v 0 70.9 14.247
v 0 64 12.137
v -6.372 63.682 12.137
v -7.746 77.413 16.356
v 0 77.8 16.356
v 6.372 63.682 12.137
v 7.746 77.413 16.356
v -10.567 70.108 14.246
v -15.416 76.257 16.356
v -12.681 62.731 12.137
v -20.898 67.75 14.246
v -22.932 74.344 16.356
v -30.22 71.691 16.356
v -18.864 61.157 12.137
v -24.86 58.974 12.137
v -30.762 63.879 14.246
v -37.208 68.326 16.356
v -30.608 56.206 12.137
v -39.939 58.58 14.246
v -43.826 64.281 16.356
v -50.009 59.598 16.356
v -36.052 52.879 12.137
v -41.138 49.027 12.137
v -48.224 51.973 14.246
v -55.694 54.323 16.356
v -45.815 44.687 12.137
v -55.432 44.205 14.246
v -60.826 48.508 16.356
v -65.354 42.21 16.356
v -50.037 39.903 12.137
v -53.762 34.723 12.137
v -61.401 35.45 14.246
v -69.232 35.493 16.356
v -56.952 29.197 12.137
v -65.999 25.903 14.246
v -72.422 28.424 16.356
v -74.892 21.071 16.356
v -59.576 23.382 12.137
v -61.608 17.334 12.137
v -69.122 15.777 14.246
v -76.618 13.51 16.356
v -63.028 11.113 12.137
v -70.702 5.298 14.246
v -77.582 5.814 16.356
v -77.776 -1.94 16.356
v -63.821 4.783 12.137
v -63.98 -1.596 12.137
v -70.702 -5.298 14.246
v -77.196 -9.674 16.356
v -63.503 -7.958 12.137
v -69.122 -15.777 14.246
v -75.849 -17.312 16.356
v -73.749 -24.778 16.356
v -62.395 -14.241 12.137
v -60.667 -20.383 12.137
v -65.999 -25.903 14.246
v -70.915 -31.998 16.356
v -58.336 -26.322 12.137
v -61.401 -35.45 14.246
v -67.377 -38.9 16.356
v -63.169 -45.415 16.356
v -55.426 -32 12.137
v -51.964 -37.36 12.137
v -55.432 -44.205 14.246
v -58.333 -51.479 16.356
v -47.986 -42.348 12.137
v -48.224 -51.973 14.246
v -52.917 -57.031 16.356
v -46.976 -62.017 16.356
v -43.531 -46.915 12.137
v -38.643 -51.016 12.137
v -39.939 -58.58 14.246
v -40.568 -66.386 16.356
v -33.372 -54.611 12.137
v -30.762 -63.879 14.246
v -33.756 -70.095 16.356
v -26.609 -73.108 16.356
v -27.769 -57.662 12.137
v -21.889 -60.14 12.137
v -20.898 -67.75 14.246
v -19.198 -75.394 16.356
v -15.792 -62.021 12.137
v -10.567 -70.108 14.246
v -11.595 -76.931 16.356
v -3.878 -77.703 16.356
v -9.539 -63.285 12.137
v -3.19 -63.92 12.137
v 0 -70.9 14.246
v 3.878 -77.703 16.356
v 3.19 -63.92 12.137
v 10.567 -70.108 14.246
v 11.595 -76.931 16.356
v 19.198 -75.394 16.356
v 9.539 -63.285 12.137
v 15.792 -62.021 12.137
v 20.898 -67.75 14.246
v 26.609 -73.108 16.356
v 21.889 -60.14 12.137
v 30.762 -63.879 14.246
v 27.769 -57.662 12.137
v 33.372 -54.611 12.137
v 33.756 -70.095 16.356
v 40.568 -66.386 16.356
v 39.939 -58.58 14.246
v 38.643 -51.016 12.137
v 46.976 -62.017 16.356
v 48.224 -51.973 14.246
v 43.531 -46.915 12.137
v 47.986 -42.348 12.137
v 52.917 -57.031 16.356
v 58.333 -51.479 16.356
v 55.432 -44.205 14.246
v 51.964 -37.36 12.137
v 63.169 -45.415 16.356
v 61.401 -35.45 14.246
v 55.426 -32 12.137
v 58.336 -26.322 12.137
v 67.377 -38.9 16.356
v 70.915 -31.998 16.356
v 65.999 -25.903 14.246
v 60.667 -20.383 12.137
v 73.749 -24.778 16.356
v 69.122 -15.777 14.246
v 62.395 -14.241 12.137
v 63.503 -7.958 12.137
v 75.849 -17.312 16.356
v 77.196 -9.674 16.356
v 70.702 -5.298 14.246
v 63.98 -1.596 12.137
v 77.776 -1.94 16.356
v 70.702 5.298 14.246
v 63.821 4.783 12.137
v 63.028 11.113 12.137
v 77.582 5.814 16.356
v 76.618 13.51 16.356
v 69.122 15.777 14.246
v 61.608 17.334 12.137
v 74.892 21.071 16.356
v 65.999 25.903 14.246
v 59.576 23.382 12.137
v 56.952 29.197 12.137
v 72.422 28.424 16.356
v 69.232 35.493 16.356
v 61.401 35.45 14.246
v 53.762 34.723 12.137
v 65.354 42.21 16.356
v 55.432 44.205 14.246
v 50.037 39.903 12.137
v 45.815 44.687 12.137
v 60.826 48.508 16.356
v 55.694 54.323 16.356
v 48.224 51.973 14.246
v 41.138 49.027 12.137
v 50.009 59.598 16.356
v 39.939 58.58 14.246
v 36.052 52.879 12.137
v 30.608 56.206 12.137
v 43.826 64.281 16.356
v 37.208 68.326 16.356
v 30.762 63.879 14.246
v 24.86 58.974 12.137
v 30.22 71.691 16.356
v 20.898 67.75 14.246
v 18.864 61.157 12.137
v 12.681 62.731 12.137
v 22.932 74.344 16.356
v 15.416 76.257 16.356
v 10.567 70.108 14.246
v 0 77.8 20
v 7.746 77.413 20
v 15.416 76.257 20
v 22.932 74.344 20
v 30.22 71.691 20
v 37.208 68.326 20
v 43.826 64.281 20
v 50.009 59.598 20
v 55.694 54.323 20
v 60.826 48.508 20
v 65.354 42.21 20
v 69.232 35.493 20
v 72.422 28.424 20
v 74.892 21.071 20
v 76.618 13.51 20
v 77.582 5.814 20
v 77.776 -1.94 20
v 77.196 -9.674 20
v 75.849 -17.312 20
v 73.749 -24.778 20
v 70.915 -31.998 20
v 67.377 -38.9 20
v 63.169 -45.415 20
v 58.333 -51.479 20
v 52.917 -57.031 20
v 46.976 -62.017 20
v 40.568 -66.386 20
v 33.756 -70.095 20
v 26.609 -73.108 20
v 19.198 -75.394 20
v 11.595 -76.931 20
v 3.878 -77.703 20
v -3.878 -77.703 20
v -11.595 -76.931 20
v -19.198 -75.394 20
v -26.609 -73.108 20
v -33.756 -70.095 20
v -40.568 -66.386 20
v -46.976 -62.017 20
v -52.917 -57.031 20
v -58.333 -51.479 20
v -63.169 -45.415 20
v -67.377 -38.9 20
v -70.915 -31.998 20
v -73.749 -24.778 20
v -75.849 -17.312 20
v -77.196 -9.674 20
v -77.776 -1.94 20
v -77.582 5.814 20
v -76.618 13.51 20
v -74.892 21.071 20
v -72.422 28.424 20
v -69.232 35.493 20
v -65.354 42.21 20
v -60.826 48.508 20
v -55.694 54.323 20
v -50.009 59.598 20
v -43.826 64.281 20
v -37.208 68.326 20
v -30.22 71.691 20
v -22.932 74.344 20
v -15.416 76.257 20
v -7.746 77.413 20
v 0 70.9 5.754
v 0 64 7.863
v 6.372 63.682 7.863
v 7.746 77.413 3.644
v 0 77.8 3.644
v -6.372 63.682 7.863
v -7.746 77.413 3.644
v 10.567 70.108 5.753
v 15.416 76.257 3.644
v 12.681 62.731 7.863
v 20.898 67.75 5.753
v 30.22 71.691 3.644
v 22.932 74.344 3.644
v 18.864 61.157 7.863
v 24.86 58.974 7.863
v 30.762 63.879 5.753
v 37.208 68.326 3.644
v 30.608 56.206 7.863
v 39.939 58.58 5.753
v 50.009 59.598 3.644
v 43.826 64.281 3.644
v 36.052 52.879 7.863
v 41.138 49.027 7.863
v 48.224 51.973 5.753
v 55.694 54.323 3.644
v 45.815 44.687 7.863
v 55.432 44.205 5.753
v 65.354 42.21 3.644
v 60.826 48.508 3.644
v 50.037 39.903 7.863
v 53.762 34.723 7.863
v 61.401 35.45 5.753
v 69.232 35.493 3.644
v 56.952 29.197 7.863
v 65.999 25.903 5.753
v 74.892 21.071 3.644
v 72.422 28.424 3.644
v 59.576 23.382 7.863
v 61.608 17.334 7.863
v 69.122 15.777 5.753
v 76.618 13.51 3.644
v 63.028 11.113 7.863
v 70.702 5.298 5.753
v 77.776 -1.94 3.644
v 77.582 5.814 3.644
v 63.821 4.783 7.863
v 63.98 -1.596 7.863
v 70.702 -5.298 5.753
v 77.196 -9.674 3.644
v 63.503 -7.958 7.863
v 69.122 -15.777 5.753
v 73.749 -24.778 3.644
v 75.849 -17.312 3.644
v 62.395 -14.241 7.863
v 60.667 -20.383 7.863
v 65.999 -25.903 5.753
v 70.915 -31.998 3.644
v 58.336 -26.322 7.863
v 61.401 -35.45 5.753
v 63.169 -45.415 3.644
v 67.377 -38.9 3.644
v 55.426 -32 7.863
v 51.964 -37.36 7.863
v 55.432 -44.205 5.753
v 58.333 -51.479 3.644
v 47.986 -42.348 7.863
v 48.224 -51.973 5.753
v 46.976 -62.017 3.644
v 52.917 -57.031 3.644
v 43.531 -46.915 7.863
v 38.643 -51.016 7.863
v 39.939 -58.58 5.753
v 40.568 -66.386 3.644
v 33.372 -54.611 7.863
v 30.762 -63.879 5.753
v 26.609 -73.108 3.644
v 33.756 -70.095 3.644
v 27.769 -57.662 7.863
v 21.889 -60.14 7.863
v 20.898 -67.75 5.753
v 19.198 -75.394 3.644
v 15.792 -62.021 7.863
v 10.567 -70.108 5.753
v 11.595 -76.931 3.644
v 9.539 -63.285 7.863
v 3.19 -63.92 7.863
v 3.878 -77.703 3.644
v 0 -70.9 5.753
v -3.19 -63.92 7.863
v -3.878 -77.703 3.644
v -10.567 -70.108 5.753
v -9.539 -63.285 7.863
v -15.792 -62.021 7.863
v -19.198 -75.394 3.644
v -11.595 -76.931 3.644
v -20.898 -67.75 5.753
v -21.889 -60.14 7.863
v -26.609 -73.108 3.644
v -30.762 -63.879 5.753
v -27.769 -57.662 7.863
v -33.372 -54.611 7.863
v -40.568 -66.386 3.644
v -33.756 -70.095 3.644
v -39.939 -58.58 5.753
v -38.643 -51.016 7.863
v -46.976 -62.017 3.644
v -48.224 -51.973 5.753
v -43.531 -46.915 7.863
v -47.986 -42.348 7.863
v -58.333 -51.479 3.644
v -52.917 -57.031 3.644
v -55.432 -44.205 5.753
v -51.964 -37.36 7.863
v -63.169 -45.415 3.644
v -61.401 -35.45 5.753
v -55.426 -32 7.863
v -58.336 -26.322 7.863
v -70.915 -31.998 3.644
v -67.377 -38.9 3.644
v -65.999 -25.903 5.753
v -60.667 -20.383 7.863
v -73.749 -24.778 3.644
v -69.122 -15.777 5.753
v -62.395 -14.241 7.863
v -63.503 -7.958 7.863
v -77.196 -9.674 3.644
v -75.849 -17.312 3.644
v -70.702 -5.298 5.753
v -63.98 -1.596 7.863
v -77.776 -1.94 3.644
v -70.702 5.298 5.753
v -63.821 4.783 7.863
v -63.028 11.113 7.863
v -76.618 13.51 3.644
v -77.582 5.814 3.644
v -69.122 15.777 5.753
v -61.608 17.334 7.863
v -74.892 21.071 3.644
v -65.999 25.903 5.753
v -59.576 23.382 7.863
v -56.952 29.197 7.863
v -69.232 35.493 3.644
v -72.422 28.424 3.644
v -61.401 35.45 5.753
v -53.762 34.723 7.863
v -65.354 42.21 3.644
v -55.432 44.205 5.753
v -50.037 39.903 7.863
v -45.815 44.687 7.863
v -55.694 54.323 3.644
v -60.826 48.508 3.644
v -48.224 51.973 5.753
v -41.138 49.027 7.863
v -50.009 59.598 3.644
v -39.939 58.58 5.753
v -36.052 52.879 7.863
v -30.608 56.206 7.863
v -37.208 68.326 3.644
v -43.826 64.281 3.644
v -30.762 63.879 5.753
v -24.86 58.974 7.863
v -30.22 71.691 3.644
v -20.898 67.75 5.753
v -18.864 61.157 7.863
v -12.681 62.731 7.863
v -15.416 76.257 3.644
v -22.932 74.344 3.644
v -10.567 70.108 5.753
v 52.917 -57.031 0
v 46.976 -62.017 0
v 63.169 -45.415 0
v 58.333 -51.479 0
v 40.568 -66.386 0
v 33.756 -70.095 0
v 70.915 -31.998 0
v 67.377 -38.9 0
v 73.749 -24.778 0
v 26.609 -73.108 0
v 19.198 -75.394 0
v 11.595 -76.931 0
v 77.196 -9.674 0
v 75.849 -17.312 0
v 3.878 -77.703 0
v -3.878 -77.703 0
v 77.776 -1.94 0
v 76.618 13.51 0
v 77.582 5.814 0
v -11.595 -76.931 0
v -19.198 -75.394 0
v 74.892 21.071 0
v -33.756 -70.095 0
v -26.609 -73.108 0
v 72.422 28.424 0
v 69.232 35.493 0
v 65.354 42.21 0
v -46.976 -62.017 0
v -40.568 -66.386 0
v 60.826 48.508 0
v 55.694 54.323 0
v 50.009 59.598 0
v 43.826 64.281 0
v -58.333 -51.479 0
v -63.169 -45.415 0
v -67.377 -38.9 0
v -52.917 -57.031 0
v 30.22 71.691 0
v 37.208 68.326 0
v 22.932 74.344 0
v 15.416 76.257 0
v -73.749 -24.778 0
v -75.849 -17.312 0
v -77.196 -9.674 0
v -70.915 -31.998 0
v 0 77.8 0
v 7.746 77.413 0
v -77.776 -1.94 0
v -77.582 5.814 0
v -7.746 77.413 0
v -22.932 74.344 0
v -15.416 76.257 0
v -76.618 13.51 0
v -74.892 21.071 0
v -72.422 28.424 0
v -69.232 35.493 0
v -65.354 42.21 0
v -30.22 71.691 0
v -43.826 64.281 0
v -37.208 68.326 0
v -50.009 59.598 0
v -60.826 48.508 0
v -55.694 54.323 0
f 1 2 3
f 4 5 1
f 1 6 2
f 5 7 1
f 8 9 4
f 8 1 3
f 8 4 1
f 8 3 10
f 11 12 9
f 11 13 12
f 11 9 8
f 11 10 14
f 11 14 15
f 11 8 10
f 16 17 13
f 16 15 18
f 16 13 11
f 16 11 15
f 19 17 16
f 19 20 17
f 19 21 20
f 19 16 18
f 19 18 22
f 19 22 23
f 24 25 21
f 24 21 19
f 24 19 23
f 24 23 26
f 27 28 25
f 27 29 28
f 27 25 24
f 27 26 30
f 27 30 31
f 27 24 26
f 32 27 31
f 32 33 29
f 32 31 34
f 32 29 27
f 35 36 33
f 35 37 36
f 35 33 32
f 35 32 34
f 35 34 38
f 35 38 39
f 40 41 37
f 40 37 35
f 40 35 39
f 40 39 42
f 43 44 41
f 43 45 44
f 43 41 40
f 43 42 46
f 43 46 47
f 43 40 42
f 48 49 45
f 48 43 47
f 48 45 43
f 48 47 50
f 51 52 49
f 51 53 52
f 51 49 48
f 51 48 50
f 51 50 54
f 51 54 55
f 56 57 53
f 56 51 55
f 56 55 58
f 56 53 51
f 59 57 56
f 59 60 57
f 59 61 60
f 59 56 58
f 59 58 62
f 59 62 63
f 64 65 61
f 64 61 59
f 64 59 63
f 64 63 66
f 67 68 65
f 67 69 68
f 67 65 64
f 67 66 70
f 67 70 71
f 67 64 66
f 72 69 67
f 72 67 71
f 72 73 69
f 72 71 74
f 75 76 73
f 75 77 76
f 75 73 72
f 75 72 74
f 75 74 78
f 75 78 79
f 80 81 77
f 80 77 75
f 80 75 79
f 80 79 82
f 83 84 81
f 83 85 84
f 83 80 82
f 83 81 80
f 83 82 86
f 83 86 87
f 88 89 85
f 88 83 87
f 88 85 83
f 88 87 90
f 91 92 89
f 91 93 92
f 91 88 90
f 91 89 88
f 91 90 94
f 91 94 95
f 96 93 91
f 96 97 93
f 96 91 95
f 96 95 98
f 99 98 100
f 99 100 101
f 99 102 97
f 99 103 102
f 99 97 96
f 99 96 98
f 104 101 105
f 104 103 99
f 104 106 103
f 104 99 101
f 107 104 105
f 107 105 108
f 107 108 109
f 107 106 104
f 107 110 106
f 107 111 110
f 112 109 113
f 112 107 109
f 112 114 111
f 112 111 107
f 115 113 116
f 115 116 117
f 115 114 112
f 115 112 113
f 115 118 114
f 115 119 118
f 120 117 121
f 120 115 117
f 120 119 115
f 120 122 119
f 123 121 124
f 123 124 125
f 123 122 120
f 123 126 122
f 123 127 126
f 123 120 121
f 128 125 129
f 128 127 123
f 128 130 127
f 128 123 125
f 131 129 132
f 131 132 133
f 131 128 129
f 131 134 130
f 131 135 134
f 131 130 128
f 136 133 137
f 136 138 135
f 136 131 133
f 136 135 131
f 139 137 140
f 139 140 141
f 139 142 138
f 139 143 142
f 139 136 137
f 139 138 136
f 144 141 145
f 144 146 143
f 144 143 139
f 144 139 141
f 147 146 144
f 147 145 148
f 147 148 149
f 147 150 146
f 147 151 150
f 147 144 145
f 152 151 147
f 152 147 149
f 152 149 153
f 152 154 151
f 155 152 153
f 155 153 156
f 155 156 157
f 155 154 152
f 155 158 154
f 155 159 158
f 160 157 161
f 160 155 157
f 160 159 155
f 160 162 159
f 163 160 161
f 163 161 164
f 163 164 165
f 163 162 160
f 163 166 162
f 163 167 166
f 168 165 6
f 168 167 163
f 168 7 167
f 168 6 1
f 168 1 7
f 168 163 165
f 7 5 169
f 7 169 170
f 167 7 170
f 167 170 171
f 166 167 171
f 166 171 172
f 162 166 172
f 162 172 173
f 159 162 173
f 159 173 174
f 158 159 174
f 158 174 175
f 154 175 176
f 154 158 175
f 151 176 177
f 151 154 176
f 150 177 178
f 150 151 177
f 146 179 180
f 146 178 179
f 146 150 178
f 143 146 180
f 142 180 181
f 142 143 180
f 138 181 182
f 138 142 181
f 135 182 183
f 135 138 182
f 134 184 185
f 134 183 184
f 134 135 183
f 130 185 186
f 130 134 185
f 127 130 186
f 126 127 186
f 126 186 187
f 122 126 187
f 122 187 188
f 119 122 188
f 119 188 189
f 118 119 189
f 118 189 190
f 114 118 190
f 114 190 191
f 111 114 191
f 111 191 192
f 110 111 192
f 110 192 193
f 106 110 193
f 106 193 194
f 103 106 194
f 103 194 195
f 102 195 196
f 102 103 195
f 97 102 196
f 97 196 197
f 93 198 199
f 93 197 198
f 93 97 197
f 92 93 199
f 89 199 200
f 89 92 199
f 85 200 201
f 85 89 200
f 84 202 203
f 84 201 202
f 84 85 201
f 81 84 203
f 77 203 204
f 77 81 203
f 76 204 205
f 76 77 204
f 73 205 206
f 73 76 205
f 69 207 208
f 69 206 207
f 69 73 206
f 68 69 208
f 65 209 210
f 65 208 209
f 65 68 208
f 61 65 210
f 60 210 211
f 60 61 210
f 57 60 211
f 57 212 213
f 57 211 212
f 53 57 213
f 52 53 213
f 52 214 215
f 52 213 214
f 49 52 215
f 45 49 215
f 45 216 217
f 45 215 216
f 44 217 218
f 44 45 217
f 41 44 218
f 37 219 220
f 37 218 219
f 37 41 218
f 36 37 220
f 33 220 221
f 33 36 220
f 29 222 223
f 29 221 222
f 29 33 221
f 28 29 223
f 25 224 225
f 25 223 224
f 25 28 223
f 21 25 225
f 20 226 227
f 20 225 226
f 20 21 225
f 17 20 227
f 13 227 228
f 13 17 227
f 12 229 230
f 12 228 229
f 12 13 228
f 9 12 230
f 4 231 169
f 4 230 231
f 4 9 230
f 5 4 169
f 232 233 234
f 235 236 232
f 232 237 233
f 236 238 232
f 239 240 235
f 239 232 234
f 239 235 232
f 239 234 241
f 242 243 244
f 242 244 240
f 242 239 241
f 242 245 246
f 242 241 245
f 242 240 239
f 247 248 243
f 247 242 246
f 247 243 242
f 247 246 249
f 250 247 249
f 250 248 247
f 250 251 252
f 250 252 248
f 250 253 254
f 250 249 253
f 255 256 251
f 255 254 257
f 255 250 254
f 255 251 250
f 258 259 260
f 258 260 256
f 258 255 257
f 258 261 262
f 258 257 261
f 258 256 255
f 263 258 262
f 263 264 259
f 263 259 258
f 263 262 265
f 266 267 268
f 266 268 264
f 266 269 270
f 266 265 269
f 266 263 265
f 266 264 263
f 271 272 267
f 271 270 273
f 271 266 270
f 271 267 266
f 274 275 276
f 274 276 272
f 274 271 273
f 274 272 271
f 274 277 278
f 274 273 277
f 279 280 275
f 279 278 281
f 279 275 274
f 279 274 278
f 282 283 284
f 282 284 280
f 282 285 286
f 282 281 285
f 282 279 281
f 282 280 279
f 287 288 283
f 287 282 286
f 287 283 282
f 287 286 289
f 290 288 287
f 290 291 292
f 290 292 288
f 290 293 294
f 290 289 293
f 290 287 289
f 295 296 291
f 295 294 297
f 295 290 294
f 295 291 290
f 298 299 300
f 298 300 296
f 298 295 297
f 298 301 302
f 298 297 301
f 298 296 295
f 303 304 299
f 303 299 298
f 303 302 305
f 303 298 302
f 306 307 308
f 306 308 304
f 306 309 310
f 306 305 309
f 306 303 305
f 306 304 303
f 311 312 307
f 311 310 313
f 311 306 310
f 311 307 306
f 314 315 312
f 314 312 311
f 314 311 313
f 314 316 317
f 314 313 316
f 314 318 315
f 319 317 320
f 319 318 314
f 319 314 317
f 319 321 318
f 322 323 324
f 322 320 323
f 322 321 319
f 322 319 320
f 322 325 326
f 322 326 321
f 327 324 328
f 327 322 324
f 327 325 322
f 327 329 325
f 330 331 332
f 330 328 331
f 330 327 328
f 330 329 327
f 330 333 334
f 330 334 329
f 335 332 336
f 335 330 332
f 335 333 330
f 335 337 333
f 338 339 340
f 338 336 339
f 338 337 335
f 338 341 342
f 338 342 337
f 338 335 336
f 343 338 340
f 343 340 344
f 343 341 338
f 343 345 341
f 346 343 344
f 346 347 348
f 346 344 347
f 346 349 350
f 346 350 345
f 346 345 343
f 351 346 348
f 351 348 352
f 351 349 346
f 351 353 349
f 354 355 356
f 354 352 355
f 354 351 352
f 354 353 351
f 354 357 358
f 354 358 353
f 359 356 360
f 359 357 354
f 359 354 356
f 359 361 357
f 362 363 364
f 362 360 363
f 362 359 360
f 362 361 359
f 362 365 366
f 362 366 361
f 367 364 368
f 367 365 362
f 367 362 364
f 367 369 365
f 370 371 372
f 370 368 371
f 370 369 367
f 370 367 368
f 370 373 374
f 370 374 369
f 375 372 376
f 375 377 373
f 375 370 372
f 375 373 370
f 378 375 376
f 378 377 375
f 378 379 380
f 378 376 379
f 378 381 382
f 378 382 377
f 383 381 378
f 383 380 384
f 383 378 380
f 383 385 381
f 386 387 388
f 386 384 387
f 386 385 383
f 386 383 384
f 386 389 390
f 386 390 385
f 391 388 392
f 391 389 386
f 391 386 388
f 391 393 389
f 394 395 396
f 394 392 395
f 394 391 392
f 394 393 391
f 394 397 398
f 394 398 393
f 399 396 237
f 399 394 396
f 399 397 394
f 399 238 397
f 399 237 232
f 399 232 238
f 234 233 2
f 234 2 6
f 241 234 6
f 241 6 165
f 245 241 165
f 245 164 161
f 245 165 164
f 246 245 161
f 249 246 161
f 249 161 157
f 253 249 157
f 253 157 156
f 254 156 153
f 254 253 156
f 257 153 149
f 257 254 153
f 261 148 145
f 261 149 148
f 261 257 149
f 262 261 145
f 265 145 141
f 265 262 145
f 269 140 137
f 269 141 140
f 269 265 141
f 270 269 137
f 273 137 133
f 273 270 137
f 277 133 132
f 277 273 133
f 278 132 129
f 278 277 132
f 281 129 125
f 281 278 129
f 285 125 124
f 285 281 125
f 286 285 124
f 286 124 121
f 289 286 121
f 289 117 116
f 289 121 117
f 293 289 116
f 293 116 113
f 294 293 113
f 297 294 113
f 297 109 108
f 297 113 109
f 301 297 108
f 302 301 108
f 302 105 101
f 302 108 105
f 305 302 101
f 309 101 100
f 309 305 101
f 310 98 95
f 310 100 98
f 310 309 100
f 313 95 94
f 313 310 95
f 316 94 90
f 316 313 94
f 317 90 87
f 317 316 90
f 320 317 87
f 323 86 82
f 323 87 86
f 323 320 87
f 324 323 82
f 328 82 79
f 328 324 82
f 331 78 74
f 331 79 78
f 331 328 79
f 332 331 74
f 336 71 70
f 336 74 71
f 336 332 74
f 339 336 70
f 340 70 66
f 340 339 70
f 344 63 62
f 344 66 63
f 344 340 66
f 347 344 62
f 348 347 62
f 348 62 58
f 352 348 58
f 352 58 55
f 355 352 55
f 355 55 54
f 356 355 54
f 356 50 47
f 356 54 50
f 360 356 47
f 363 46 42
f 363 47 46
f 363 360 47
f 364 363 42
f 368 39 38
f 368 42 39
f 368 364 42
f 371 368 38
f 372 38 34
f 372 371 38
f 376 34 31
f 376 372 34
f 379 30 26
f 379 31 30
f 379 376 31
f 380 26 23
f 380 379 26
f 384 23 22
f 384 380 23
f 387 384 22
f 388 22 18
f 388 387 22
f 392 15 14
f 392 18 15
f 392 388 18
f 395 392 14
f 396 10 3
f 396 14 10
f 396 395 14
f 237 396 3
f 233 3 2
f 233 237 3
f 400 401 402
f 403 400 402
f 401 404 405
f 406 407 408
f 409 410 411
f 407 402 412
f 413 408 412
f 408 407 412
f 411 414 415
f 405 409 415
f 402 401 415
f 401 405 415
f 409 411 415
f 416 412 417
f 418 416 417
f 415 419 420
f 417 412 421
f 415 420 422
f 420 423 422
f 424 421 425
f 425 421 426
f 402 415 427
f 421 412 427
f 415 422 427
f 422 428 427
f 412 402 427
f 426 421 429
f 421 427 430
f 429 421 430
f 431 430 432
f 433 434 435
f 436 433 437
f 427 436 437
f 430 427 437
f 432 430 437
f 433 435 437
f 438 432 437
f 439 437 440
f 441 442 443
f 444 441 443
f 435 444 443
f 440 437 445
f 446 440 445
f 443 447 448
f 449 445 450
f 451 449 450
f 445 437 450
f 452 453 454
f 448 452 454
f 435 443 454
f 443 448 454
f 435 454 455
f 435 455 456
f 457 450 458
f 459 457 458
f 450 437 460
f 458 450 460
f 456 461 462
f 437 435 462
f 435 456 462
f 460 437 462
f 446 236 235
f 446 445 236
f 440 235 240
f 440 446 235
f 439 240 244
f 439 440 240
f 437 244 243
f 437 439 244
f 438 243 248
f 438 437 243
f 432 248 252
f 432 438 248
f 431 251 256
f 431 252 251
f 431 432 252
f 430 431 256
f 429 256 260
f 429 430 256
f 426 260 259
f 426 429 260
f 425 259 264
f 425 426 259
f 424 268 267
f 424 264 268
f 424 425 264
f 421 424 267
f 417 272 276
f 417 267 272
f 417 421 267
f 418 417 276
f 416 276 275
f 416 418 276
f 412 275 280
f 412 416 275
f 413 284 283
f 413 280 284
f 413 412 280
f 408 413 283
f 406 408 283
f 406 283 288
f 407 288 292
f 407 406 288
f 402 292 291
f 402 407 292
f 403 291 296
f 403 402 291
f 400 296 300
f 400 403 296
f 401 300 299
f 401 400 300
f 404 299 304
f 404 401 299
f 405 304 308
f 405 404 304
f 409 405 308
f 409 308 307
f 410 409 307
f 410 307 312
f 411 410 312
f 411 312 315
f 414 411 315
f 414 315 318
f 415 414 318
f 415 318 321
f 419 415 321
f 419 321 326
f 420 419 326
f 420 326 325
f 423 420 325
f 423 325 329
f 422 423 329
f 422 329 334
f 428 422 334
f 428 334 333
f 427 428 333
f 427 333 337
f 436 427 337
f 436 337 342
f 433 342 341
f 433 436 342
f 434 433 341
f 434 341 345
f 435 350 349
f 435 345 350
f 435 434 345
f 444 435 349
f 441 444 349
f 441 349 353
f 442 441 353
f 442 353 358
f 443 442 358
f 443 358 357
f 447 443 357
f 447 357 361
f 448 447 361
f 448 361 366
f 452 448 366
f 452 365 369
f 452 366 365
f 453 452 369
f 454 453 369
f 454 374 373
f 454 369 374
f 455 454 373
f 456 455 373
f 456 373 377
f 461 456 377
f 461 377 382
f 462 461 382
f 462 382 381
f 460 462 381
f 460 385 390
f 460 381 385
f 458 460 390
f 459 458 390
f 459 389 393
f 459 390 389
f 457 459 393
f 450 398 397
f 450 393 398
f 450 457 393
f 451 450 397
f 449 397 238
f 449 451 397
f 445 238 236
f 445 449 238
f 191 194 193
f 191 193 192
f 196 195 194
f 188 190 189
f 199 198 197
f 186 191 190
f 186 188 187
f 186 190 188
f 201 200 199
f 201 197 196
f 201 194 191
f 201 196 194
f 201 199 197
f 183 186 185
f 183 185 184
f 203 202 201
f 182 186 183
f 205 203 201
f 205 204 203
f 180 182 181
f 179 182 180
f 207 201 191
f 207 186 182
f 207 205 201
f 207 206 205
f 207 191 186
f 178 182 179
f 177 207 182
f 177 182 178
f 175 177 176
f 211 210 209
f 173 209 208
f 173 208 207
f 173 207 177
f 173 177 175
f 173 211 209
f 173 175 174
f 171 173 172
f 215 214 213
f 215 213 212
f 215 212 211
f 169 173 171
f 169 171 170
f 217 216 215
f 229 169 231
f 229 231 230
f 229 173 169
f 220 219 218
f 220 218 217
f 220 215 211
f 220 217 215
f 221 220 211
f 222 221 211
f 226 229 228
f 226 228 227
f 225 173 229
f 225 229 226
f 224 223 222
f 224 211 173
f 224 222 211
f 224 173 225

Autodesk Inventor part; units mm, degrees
ref_plane "YZ Plane" through (0, 0, 0) normal (1, 0, 0) x (0, 1, 0)
ref_plane "XZ Plane" through (0, 0, 0) normal (0, 1, 0) x (-1, 0, 0)
sketch "Boceto principal" plane through (0, 0, 0) normal (1, 0, 0) x (0, 1, 0)
  line L0 (0, 20) -> (77.8, 20)
  line L1 (77.8, 20) -> (77.8, 16.356)
  line L2 (77.8, 16.356) -> (64, 12.137)
  line L3 (64, 12.137) -> (64, 7.863)
  line L4 (64, 7.863) -> (77.8, 3.644)
  line L5 (77.8, 3.644) -> (77.8, 0)
  line L6 (77.8, 0) -> (0, 0)
  line L7 (75, 15.5) -> (75, 4.5) construction
  line L8 (64, 10) -> (75, 10) construction
  line L9 (77.8, 16.356) -> (77.8, 3.644)
  line L10 (0, -4) -> (0, 24) projected
  line L11 (0, 0) -> (0, 20)
  dimension "d0" = 11
  dimension "d1" = 34
  dimension "d2" = 2.8
  dimension "d6" = 20
  dimension "d21" = 150
  dimension "d25" = 13.8
  dimension "d27" = 10
ref_plane "Plano de correa" through (0, 64, 10) normal (0, 0, 1) x (1, 0, 0)
revolve "Cuerpo" add sketch "Boceto principal" angle 360 about axis through (0, 0, -10) along (0, 0, 1)
revolve "Para ranuras" cut sketch "Boceto principal" angle 360 about axis through (0, 0, -10) along (0, 0, 1) contours L9 L4 L3 L2
fillet "Empalme externo" [suppressed]
fillet "Empalme interno" [suppressed]
pattern_of_one "Patrón para ranuras"
equation "\"d0\" = da_Bw"
equation "\"d1\" = da_Alfa"
equation "\"d2\" = da_c"
equation "\"d21\" = da_Dw"
equation "\"d25\" = da_Hd"
equation "\"d27\" = da_Se"
equation "\"da_r1\" = 0"
equation "\"da_r2\" = 0"
equation "\"d18\" = da_Sg"
equation "\"da_Bw\" = 11"
equation "\"da_Alfa\" = 34deg"
equation "\"da_c\" = 2.8"
equation "\"da_Dw\" = 150"
equation "\"da_Hd\" = 13.8"
equation "\"da_Se\" = 10"
equation "\"da_Sg\" = 15"
properties part number "Polea ranurada1" material "Steel"
